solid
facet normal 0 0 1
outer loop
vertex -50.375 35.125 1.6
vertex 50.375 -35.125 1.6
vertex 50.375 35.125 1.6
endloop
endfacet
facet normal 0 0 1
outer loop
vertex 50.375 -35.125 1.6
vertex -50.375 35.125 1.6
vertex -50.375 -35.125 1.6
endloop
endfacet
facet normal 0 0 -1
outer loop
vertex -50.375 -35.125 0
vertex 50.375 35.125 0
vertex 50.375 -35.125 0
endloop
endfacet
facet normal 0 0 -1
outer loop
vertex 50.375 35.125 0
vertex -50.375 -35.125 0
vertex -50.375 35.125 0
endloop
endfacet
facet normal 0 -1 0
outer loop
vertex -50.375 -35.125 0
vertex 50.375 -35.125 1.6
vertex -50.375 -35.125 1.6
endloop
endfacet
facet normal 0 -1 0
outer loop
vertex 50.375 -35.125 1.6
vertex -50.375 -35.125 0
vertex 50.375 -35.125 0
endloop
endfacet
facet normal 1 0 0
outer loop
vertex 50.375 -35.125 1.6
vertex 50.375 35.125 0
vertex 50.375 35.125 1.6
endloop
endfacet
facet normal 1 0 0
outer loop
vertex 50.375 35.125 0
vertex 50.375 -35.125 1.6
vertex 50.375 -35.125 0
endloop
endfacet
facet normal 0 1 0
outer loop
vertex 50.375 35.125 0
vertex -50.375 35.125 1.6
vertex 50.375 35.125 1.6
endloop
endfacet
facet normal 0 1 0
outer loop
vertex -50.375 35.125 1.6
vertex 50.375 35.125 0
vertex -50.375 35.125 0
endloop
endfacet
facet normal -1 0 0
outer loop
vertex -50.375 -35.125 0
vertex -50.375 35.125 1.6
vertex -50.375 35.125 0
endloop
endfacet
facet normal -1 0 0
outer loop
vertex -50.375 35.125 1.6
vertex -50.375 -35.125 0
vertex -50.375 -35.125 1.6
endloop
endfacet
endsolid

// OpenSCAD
$fn = 64;

board_x = 100.75;
board_y = 70.25;
board_th = 1.6;

color([0.05, 0.45, 0.12])
translate([-board_x/2, -board_y/2, 0])
cube([board_x, board_y, board_th], center=false);
